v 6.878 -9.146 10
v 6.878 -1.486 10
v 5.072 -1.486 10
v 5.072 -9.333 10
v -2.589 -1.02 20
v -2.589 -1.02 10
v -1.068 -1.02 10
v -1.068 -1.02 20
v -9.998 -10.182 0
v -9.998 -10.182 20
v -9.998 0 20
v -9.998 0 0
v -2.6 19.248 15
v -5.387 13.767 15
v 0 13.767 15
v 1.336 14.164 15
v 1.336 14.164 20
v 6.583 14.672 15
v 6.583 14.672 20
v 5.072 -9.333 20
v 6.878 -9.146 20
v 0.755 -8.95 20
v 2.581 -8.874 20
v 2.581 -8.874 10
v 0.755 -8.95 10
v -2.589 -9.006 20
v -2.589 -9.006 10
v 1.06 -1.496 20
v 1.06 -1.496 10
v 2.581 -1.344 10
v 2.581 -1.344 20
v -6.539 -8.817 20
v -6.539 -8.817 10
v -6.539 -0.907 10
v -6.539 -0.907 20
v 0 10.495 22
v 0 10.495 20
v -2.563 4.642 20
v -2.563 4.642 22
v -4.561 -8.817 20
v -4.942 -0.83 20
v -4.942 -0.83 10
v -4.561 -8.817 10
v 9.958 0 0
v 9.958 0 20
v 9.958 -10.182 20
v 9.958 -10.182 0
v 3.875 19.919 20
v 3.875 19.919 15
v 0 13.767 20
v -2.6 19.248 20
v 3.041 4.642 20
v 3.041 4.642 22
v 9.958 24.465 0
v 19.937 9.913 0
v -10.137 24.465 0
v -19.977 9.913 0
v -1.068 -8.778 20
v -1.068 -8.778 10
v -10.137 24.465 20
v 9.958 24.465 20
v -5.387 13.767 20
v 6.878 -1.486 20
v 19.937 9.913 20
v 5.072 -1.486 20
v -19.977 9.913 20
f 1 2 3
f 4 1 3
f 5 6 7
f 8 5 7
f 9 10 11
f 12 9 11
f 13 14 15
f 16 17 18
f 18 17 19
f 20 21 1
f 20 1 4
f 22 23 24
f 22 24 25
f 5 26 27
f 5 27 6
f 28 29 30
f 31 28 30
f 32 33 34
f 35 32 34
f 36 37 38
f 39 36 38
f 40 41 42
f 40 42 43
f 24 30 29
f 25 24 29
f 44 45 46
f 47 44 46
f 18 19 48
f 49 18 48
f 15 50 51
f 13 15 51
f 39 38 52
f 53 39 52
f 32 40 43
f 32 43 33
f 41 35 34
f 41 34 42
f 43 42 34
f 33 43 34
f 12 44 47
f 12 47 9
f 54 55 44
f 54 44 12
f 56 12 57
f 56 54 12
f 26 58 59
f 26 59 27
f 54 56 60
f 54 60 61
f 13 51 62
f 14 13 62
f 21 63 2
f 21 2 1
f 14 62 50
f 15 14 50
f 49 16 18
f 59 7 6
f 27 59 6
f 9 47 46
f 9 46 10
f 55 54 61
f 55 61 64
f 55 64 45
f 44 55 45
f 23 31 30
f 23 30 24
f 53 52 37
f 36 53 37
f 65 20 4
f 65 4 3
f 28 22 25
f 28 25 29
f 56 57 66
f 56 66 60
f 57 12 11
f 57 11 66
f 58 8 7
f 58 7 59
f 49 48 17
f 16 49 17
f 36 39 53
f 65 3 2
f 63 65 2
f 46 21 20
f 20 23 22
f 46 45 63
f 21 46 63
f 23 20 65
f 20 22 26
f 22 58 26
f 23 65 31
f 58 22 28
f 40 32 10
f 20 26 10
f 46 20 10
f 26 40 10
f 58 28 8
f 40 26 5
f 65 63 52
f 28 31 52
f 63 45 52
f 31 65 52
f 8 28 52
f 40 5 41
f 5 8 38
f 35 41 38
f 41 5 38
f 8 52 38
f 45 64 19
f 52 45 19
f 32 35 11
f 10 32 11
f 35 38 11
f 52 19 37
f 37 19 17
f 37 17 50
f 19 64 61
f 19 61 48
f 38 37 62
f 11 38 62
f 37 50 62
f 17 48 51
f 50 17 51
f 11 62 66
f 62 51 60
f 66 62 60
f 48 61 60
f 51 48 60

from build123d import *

# Parameters (mm, degrees)
PAD_DEPTH       = 20
POCKET_DEPTH    = 5
POCKET001_DEPTH = 5
POCKET002_DEPTH = 10
POCKET003_DEPTH = 10
POCKET004_DEPTH = 10
POCKET005_DEPTH = 10
PAD001_DEPTH    = 2


with BuildPart() as part:
    # Sketch → Pad (new body)
    with BuildSketch(Plane.XY):
        Polygon((-10.136965, 24.465265), (9.95841, 24.465265), (19.936804, 9.913441), (9.95841, 0), (9.95841, -10.181935), (-9.998377, -10.181935), (-9.998377, 0), (-19.97677, 9.913441), align=None)
    extrude(amount=PAD_DEPTH)

    # Sketch001 (on Face10 of Pad) → Pocket (cut)
    with BuildSketch(Plane.XY.offset(20)):
        Polygon((-5.386747, 13.766779), (0, 13.766779), (-2.599782, 19.24781), align=None)
    extrude(amount=-POCKET_DEPTH, mode=Mode.SUBTRACT)

    # Sketch002 (on Face5 of Pocket) → Pocket001 (cut)
    with BuildSketch(Plane.XY.offset(20)):
        Polygon((1.335867, 14.164042), (6.583323, 14.671863), (3.87496, 19.919313), align=None)
    extrude(amount=-POCKET001_DEPTH, mode=Mode.SUBTRACT)

    # Sketch003 (on Face5 of Pocket001) → Pocket002 (cut)
    with BuildSketch(Plane.XY.offset(20)):
        Polygon((-6.538883, -0.90654), (-4.94164, -0.83048), (-4.561344, -8.816691), (-6.538883, -8.816691), align=None)
    extrude(amount=-POCKET002_DEPTH, mode=Mode.SUBTRACT)

    # Sketch004 (on Face5 of Pocket002) → Pocket003 (cut)
    with BuildSketch(Plane.XY.offset(20)):
        Polygon((-2.588899, -1.019739), (-1.067716, -1.019739), (-1.067716, -8.777773), (-2.588899, -9.00595), align=None)
    extrude(amount=-POCKET003_DEPTH, mode=Mode.SUBTRACT)

    # Sketch005 (on Face5 of Pocket003) → Pocket004 (cut)
    with BuildSketch(Plane.XY.offset(20)):
        Polygon((1.05956, -1.495936), (2.580743, -1.343817), (2.580743, -8.873672), (0.755325, -8.949731), align=None)
    extrude(amount=-POCKET004_DEPTH, mode=Mode.SUBTRACT)

    # Sketch006 (on Face5 of Pocket004) → Pocket005 (cut)
    with BuildSketch(Plane.XY.offset(20)):
        Polygon((5.072445, -1.486341), (6.878333, -1.486341), (6.878333, -9.145793), (5.072445, -9.33261), align=None)
    extrude(amount=-POCKET005_DEPTH, mode=Mode.SUBTRACT)

    # Sketch007 (on Face5 of Pocket005) → Pad001 (join)
    with BuildSketch(Plane.XY.offset(20)):
        Polygon((0, 10.495331), (-2.563093, 4.641765), (3.041384, 4.641765), align=None)
    extrude(amount=PAD001_DEPTH)


solid = part.part
